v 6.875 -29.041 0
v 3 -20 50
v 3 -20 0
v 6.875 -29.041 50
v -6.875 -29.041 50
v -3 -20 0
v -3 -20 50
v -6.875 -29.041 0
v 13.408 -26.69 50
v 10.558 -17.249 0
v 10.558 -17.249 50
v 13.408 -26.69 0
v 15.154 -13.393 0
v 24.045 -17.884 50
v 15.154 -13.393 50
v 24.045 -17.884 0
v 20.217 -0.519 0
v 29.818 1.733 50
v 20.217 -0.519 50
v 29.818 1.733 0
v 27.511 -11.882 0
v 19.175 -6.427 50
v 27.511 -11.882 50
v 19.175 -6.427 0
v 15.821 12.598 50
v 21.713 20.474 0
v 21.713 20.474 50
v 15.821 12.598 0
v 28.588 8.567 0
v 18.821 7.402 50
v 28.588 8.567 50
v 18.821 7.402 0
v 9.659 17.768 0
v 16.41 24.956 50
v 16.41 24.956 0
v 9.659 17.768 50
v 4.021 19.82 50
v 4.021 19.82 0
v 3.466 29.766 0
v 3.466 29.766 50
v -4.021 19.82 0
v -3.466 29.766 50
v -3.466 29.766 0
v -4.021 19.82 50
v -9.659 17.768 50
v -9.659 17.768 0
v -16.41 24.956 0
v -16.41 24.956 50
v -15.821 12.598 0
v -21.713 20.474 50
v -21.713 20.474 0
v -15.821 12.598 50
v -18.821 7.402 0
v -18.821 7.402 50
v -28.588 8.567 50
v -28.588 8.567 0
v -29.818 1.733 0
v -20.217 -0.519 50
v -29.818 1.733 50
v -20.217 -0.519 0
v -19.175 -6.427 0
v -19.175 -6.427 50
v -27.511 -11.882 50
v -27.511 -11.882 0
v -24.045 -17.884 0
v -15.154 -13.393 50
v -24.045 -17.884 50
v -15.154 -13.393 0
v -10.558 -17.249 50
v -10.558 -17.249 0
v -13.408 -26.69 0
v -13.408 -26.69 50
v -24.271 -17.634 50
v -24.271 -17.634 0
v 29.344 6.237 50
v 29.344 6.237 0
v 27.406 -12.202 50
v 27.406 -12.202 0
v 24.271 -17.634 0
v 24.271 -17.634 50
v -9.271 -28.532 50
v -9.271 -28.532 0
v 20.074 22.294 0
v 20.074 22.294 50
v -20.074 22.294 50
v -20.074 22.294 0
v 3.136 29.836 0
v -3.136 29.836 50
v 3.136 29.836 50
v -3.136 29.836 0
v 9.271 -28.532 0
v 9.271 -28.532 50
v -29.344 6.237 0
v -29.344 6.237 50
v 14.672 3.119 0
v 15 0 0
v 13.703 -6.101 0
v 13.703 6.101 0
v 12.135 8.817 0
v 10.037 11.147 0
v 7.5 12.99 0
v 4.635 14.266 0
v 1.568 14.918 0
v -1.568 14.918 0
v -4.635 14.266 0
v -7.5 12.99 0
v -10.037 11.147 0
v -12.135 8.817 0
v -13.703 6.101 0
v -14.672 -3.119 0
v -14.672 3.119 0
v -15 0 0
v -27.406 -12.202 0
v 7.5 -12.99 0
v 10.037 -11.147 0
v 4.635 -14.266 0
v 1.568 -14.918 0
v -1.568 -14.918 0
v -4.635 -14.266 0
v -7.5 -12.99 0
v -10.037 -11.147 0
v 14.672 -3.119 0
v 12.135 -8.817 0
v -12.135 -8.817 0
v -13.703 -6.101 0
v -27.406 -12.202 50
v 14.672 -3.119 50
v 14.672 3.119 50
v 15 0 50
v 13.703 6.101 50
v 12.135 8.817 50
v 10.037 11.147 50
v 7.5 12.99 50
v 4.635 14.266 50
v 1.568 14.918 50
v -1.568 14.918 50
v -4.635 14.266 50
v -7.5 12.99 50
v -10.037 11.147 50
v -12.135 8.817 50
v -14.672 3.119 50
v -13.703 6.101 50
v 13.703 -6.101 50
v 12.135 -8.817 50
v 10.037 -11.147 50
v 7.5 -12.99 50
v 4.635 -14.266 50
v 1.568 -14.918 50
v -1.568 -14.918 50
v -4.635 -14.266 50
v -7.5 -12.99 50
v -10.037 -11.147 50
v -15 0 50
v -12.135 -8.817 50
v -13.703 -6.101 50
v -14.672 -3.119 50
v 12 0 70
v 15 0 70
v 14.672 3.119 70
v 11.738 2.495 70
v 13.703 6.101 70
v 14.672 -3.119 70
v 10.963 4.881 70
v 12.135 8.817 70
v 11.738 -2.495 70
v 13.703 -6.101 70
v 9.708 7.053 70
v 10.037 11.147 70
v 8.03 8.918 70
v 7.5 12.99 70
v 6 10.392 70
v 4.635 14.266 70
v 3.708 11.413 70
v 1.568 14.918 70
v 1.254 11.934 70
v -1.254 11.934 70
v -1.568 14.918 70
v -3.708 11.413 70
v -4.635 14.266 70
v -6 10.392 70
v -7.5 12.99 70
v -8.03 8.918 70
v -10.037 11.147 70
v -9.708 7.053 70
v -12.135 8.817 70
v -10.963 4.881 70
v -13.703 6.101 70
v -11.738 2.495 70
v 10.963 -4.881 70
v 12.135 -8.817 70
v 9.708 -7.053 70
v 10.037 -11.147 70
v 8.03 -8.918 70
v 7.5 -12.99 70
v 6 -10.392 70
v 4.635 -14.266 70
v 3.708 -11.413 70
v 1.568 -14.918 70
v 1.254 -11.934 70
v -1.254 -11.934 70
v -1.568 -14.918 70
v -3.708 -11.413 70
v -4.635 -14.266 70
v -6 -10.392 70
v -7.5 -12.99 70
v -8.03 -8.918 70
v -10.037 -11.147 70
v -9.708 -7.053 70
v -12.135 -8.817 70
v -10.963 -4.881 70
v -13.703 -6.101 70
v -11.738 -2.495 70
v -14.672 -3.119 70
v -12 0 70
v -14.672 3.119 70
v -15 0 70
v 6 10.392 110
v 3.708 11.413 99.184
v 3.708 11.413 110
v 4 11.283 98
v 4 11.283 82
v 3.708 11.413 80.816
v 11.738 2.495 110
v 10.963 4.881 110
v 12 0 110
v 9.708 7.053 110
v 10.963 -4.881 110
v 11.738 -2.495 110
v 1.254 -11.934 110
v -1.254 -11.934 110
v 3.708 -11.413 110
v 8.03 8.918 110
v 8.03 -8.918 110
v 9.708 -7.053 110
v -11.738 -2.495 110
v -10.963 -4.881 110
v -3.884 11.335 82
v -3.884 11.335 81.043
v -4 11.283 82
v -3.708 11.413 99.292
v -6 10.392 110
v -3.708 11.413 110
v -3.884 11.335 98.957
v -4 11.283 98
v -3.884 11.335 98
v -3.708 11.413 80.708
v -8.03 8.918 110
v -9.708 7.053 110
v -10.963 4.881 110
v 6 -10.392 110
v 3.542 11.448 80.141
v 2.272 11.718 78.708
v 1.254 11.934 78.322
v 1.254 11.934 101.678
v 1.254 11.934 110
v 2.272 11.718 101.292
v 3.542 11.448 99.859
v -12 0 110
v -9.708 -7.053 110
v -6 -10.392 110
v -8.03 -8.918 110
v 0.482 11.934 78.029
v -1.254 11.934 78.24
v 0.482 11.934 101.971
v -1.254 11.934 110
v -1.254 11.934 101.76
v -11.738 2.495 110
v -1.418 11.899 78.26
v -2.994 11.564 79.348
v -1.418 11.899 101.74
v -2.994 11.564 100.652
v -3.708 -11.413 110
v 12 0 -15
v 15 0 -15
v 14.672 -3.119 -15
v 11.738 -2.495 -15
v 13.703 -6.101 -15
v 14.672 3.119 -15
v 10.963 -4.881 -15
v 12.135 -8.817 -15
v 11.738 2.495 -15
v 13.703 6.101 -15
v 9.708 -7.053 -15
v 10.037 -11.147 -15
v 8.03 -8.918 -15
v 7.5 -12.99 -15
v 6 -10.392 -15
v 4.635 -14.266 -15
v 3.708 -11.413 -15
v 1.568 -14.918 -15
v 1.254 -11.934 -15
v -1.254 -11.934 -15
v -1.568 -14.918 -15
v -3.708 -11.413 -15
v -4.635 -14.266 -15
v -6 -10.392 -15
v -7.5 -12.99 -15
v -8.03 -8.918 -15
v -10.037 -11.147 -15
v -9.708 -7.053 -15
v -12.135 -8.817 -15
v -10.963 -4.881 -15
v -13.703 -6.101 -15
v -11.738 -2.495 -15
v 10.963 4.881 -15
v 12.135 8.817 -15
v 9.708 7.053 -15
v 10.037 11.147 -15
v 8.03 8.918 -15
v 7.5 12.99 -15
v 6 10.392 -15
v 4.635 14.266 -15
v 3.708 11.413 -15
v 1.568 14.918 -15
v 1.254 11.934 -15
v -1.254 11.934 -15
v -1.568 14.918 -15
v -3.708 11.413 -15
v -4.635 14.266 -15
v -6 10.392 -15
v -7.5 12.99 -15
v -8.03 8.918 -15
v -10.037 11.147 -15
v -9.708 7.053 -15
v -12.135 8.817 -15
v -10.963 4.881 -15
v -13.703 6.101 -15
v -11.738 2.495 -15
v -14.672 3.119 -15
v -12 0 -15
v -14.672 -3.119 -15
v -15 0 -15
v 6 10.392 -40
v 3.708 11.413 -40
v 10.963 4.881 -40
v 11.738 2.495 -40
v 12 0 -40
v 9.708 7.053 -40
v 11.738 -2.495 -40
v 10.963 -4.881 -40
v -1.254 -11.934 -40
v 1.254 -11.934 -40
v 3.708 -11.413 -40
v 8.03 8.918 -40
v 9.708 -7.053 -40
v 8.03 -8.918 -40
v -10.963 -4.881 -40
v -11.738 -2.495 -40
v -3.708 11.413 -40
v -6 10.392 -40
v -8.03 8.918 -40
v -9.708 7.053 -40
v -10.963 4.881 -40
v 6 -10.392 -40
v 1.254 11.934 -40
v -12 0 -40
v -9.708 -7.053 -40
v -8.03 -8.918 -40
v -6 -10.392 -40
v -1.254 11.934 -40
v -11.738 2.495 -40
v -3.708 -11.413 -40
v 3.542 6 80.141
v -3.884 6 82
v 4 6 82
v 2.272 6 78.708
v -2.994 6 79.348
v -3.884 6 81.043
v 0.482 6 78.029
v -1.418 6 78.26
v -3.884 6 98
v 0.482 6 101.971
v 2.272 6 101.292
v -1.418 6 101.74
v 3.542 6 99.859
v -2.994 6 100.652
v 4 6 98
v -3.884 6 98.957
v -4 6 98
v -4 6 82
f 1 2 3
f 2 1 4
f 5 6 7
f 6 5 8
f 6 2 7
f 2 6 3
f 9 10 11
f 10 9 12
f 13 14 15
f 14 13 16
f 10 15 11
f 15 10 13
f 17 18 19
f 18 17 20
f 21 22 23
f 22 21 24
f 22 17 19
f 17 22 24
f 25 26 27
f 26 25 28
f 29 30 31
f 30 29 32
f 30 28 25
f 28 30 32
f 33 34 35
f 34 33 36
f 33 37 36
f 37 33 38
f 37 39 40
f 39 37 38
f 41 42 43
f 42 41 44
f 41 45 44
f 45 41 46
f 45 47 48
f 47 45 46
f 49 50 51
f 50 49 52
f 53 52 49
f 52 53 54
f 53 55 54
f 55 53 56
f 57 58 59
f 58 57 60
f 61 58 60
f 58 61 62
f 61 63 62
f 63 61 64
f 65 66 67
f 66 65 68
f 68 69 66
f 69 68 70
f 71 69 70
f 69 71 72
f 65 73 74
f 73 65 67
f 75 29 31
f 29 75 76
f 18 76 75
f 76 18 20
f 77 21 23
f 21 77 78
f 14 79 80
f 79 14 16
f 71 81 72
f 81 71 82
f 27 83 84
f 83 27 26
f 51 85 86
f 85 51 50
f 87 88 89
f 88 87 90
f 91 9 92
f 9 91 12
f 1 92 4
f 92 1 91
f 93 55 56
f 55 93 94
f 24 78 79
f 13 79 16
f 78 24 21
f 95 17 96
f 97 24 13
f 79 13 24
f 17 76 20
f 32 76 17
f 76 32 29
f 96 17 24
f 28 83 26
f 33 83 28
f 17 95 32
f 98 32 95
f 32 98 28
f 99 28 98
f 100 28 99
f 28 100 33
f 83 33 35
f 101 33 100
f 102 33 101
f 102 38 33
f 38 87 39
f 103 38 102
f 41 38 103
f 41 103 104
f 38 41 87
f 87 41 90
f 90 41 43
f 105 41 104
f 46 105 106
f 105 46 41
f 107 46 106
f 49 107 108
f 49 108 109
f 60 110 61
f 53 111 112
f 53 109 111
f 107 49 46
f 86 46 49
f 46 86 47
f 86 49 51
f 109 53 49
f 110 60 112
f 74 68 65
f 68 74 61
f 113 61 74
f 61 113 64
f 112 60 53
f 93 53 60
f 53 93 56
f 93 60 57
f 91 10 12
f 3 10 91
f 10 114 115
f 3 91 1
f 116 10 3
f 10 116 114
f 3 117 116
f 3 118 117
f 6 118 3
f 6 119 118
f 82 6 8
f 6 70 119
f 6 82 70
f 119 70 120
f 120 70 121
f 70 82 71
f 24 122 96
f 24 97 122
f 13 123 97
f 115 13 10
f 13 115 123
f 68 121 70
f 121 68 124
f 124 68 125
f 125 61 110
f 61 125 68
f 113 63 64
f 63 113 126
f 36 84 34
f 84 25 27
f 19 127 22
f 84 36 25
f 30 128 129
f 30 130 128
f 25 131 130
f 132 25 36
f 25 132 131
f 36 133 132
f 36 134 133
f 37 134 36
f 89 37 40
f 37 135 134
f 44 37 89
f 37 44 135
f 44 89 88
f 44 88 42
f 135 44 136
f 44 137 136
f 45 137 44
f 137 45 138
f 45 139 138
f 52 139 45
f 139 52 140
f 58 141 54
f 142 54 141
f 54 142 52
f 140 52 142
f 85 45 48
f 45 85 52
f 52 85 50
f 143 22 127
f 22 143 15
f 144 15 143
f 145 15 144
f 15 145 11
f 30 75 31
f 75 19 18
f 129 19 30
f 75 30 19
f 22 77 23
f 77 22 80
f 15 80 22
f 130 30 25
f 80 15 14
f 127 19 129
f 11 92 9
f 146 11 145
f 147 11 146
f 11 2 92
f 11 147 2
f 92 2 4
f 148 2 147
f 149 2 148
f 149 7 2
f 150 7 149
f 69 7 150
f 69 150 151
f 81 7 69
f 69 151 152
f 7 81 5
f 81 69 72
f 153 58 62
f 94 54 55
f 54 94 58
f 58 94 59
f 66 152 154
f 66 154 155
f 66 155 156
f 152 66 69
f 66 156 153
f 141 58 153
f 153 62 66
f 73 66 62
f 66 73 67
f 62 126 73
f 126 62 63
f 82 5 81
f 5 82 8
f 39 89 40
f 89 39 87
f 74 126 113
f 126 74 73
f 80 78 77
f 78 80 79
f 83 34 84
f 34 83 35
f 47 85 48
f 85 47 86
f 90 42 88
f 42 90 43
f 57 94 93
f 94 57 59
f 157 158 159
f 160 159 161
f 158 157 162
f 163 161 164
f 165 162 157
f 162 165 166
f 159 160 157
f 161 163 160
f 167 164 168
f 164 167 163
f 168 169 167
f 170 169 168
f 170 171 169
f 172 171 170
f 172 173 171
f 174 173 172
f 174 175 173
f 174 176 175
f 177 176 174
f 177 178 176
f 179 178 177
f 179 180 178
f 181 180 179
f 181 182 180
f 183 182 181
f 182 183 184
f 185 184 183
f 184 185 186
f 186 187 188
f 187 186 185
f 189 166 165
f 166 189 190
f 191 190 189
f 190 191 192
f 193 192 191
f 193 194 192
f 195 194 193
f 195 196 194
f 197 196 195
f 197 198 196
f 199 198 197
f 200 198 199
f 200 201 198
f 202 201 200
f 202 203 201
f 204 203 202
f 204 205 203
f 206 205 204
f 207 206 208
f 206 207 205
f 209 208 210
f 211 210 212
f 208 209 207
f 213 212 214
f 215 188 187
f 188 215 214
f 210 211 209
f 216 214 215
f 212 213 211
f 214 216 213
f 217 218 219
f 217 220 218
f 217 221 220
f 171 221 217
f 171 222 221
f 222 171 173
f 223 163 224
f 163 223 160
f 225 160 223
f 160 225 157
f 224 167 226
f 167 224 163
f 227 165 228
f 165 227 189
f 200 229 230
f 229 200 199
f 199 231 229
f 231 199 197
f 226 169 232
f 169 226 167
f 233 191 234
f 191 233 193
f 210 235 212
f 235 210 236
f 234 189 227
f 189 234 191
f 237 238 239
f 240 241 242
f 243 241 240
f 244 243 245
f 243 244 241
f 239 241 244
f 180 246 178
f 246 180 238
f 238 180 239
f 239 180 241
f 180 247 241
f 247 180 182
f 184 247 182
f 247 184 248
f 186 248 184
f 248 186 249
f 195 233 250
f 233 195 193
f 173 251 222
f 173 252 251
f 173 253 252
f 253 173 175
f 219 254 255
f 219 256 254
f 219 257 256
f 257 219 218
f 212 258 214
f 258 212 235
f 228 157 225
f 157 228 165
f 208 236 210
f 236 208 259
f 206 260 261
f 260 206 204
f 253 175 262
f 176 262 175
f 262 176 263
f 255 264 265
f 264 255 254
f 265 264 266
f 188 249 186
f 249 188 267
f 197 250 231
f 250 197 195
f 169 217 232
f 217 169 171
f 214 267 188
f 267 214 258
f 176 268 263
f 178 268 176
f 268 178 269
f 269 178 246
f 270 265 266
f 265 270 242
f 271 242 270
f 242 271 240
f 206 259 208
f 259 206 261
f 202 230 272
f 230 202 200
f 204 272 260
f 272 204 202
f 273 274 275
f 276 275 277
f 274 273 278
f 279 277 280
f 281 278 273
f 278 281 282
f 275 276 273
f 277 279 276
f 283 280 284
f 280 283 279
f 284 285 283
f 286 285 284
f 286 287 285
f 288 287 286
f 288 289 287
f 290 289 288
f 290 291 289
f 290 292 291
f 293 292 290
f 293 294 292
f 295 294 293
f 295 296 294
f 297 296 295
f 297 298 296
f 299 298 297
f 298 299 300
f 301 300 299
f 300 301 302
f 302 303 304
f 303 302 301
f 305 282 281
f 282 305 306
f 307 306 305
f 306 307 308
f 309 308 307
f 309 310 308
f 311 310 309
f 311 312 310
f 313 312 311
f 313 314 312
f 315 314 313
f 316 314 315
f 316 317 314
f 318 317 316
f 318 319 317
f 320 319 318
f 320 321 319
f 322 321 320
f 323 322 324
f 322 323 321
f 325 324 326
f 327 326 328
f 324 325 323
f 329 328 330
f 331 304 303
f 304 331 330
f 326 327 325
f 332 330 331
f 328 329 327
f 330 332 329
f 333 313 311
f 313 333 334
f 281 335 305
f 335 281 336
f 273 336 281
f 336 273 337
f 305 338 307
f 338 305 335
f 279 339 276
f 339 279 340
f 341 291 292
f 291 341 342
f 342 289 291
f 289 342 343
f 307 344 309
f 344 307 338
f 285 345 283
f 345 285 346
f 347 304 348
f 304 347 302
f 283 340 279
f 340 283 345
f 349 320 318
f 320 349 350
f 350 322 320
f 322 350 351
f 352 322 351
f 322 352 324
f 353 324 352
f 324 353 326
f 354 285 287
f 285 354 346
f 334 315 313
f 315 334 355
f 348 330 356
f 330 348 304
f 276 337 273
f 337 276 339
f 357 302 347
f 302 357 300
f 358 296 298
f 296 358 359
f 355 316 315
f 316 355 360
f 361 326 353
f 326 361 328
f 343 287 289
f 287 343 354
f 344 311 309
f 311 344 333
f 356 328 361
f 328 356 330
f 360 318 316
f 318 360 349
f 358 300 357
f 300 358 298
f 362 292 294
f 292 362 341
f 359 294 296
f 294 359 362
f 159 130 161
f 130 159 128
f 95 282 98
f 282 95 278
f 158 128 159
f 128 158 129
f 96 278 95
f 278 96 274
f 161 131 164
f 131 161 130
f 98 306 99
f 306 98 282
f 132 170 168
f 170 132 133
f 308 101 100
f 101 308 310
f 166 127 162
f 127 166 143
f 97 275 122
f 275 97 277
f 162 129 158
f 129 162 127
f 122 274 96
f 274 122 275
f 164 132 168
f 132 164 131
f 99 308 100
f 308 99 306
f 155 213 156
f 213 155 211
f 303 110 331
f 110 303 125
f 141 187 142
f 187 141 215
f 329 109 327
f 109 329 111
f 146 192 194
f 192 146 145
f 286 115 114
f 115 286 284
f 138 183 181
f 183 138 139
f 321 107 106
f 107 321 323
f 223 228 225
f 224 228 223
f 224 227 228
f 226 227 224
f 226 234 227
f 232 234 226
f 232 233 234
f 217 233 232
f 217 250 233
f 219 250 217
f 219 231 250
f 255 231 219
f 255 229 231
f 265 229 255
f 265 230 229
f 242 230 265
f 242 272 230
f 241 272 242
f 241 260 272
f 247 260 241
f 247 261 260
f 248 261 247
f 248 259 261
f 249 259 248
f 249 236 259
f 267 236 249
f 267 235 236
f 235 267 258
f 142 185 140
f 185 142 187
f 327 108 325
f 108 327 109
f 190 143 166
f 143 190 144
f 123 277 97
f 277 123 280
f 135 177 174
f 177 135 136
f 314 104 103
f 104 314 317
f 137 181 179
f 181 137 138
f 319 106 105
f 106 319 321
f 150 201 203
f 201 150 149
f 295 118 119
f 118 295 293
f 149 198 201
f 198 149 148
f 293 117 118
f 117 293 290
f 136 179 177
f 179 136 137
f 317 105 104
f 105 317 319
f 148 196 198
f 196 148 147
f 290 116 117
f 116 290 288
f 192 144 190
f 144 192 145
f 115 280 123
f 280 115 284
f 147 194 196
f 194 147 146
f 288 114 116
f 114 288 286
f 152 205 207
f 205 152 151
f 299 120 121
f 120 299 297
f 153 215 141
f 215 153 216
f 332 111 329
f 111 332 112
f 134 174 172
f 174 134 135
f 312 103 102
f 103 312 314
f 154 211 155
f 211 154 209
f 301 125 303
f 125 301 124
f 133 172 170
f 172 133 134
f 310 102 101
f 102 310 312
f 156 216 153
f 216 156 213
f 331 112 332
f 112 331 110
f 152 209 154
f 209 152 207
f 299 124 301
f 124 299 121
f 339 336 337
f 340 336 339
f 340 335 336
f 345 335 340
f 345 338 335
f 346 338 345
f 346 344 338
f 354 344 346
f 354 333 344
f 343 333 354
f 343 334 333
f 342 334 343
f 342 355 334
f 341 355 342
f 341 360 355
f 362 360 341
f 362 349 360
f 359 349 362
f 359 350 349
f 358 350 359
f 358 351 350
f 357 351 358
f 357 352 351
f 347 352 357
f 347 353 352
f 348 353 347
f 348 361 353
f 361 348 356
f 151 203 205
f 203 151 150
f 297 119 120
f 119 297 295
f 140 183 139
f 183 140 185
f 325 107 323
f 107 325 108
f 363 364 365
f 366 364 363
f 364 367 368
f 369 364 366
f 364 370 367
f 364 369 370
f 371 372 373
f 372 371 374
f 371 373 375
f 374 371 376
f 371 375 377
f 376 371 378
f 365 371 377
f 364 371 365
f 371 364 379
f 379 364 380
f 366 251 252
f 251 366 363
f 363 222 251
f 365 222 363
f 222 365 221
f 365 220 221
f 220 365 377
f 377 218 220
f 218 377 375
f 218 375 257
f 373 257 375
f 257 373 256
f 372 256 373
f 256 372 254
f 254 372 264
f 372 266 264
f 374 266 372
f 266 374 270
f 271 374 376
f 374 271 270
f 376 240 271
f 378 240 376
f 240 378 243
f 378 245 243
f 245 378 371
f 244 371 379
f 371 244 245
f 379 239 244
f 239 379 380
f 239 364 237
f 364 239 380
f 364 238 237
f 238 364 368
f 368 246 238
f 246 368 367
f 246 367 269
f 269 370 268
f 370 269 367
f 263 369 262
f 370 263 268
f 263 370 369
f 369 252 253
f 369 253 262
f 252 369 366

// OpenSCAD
//$fn = 20;

teeth_factor = 1;

union() {
    difference() {
        cylinder(d=60, h=50);
        
        for(angle=[0:40*teeth_factor:360])
            rotate([0,0,angle])
            color("blue")
            translate([0,-30,-10])
            linear_extrude(70)
            scale([teeth_factor, teeth_factor])
            polygon([[-9,-4],[9,-4],[3,10],[-3,10]]);
    }

    difference() {
        translate([0,0,-40])
        cylinder(d=30, h=150);
        
        difference() {
            translate([0,0,70])
            cylinder(d=35, h=60);
            
            translate([0,0,70])
            cylinder(d=24, h=50);
        }
        
        difference() {
            translate([0,0,-45])
            cylinder(d=35, h=30);
            
            translate([0,0,-45])
            cylinder(d=24, h=30);
        }
        
        color("green")
        translate([-4,13,82])
        rotate([90,0,0])
        linear_extrude(7)
        
        union() {
            square([8, 16]);
            translate([4,0,0]) circle(d=8);
            translate([4,16,0]) circle(d=8);
        }
    }
}
